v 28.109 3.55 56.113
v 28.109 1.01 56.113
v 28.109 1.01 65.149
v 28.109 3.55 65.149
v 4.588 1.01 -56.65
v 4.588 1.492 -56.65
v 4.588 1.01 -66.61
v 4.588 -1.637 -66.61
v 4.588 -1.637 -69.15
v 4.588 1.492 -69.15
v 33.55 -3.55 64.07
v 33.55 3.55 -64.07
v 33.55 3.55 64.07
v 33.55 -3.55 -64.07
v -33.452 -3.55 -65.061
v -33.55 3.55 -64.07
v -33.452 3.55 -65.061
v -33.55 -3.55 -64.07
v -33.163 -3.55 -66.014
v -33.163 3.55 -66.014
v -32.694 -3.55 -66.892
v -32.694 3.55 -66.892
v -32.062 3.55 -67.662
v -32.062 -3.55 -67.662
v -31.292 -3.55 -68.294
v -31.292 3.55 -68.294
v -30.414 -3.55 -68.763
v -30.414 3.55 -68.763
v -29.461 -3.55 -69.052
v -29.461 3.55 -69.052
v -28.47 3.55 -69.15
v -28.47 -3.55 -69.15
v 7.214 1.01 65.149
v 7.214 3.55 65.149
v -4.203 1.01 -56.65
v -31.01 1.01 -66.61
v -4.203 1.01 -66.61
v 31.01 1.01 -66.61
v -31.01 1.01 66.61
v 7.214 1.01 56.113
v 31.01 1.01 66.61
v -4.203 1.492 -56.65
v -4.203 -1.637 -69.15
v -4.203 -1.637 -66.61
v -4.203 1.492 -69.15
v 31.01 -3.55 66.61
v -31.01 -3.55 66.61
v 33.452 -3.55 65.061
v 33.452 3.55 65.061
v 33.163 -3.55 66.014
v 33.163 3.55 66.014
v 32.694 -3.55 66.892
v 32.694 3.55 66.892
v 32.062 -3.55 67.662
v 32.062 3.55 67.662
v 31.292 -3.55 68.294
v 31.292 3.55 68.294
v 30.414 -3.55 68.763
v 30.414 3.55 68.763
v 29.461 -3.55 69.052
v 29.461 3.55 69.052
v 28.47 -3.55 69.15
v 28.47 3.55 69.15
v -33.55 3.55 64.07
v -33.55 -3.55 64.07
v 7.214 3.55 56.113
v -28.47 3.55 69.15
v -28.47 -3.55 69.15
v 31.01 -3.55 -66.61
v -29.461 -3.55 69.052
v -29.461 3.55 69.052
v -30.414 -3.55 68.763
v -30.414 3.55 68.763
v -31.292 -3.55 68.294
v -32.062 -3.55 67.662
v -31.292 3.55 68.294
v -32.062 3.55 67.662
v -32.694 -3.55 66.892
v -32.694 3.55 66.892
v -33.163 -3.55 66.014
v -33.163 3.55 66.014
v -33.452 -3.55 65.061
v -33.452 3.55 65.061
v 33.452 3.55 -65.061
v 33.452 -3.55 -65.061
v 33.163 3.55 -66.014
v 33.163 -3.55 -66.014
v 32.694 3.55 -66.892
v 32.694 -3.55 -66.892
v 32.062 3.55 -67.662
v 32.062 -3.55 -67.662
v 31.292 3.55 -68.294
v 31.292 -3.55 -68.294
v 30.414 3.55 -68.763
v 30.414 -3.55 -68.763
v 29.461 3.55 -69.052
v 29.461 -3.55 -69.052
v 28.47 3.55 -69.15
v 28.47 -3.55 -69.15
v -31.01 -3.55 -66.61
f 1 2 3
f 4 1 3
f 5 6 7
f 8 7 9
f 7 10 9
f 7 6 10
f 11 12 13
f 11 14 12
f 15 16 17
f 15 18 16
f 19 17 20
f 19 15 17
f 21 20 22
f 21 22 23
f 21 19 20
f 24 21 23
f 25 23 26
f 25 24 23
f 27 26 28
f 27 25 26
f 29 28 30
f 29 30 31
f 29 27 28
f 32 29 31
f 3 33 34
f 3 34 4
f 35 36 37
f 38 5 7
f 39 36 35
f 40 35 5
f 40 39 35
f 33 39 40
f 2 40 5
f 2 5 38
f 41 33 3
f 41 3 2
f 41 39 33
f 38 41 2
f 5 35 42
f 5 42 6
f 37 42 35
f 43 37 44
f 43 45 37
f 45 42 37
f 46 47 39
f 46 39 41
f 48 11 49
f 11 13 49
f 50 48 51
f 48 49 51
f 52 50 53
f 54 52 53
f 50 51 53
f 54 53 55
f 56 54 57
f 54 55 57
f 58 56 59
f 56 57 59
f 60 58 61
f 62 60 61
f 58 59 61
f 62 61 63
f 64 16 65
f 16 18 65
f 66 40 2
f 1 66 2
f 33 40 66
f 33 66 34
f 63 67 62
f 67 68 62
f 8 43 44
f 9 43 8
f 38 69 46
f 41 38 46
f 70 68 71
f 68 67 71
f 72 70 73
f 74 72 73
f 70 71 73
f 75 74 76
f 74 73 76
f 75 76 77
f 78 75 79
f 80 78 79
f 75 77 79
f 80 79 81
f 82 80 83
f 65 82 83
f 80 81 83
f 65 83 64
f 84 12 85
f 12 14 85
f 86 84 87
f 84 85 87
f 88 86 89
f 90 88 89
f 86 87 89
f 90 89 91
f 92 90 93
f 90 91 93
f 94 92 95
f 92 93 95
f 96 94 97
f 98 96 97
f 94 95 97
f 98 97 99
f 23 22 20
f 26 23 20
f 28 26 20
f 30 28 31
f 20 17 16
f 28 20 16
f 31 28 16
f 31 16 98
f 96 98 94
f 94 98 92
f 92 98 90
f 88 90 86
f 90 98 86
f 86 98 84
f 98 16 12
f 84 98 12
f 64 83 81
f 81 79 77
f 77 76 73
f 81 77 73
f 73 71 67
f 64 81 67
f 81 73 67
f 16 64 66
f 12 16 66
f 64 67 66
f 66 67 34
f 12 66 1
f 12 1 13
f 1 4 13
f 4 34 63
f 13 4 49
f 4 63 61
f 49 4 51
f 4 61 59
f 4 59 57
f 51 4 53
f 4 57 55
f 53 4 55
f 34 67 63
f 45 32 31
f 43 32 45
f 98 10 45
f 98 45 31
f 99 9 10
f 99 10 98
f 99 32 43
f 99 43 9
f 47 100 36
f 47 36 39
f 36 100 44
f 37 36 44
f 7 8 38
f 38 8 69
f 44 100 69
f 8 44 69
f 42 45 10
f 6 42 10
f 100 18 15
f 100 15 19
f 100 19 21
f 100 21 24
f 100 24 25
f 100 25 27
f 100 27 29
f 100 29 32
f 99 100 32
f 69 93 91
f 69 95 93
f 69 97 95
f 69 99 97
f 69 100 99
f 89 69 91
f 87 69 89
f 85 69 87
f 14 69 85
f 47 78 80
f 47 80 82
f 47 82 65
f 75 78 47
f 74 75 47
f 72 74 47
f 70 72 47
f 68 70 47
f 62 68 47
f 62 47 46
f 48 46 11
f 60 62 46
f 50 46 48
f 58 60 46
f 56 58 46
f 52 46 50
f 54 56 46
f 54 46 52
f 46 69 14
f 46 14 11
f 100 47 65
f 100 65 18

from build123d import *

# Parameters (mm, degrees)
F0_W     = 67.1
F0_H     = 138.3
F1_DEPTH = 3.55
F2_T     = -2.54
F3_R     = 5.08
F4_W     = 20.894948
F4_H     = 9.035654
F5_DEPTH = 12.5
F6_W     = 8.791138
F6_H     = 3.129049
F7_DEPTH = 12.5


with BuildPart() as f1:
    # F0 (on Front) → F1 (new body, symmetric)
    with BuildSketch(Plane.XZ):
        Rectangle(F0_W, F0_H)
    extrude(amount=F1_DEPTH, both=True)

    # F2
    f2_openings = [f1.faces().sort_by_distance(p)[0] for p in [
        (0, -3.55, 0),
    ]]
    offset(amount=F2_T, openings=f2_openings)

    # F3
    f3_edges = [f1.edges().sort_by_distance(p)[0] for p in [
        (-33.55, 0, -69.15),
        (-33.55, 0, 69.15),
        (33.55, 0, 69.15),
        (33.55, 0, -69.15),
    ]]
    fillet(f3_edges, radius=F3_R)

    # F4 (on Front) → F5 (cut, symmetric)
    with BuildSketch(Plane.XZ):
        with Locations((17.661508, 60.631018)):
            Rectangle(F4_W, F4_H)
    extrude(amount=F5_DEPTH, both=True, mode=Mode.SUBTRACT)

    # F6 (on face) → F7 (cut, symmetric)
    with BuildSketch(Plane(origin=(0, 0, -69.15), x_dir=(1, 0, 0), z_dir=(0, 0, -1))):
        with Locations((0.192333, 0.072404)):
            Rectangle(F6_W, F6_H)
    extrude(amount=F7_DEPTH, both=True, mode=Mode.SUBTRACT)


solid = f1.part
